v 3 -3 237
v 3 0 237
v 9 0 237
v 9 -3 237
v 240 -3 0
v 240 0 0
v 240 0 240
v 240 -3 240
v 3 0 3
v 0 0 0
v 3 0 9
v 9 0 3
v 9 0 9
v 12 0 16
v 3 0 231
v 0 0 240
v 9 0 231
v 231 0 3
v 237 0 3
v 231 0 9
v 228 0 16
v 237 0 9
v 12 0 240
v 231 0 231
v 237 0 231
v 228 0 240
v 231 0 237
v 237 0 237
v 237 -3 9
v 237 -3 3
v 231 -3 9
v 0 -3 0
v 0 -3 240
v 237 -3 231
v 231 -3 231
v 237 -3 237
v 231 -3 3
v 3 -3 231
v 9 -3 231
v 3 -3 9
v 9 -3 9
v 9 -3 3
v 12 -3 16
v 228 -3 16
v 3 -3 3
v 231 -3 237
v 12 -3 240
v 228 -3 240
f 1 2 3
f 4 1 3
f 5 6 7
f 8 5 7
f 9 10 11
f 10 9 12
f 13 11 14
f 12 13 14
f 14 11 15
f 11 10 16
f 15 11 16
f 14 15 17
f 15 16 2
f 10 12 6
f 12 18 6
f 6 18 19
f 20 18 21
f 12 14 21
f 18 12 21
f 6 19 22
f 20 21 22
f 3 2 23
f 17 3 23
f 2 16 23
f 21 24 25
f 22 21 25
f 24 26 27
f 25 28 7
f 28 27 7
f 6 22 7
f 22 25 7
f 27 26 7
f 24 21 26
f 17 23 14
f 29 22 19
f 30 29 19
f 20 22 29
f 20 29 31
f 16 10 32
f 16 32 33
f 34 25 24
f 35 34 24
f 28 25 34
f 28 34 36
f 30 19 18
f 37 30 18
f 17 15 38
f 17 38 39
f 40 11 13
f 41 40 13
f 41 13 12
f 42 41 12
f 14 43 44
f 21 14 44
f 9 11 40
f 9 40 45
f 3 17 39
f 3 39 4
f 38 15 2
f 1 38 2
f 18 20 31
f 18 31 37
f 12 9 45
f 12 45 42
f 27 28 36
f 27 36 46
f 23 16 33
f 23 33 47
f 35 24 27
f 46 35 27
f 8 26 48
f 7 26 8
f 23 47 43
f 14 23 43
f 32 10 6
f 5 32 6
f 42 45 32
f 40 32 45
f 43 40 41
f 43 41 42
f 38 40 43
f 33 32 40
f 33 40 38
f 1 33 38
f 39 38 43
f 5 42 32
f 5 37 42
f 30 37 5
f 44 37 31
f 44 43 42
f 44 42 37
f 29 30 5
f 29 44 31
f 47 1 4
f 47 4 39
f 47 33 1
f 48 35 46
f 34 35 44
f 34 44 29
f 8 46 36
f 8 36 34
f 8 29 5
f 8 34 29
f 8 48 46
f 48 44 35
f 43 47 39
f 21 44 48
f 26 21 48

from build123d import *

# Parameters (mm, degrees)
F1_W     = 240
F1_H     = 240
F1_W_2   = 6
F1_H_2   = 6
F1_W_3   = 208
F1_H_3   = 208
F2_DEPTH = 3
F3_DEPTH = 25
F8_W     = 216
F8_H     = 16
F8_W_2   = 208
F8_H_2   = 208
F9_DEPTH = 3.001


with BuildPart() as f2:
    # F1 (on Front) → F2 (new body)
    with BuildSketch(Plane.XZ):
        with Locations((120, 120)):
            Rectangle(F1_W, F1_H)
        with Locations((6, 234)):
            Rectangle(F1_W_2, F1_H_2, mode=Mode.SUBTRACT)
        with Locations((120, 120)):
            Rectangle(F1_W_3, F1_H_3, mode=Mode.SUBTRACT)
        with Locations((6, 234)):
            Rectangle(F1_W_2, F1_H_2)
    extrude(amount=F2_DEPTH)

    # F1 (on Front) → F3 (cut)
    with BuildSketch(Plane.XZ):
        with Locations((6, 234)):
            Rectangle(F1_W_2, F1_H_2)
    extrude(amount=F3_DEPTH, mode=Mode.SUBTRACT)

    # F5: F2 across plane


with BuildPart() as f2_1:
    add(f2.part)
    add(f2.part.mirror(Plane(origin=(120, -1.5, 120), x_dir=(0, -1, 0), z_dir=(-1, 0, 0))), mode=Mode.INTERSECT)

    # F7: F2 across plane


with BuildPart() as f2_2:
    add(f2_1.part)
    add(f2_1.part.mirror(Plane(origin=(120, -1.5, 120), x_dir=(1, 0, 0), z_dir=(0, 0, 1))), mode=Mode.INTERSECT)

    # F8 (on face) → F9 (cut, through all)
    with BuildSketch(Plane.XZ.offset(3)):
        with Locations((120, 248)):
            Rectangle(F8_W, F8_H)
        with Locations((120, 120)):
            Rectangle(F8_W_2, F8_H_2)
        Polygon((228, 240), (12, 240), (12, 16), (16, 16), (16, 224), (224, 224), (224, 16), (228, 16), align=None)
    extrude(amount=-F9_DEPTH, mode=Mode.SUBTRACT)


solid = f2_2.part
